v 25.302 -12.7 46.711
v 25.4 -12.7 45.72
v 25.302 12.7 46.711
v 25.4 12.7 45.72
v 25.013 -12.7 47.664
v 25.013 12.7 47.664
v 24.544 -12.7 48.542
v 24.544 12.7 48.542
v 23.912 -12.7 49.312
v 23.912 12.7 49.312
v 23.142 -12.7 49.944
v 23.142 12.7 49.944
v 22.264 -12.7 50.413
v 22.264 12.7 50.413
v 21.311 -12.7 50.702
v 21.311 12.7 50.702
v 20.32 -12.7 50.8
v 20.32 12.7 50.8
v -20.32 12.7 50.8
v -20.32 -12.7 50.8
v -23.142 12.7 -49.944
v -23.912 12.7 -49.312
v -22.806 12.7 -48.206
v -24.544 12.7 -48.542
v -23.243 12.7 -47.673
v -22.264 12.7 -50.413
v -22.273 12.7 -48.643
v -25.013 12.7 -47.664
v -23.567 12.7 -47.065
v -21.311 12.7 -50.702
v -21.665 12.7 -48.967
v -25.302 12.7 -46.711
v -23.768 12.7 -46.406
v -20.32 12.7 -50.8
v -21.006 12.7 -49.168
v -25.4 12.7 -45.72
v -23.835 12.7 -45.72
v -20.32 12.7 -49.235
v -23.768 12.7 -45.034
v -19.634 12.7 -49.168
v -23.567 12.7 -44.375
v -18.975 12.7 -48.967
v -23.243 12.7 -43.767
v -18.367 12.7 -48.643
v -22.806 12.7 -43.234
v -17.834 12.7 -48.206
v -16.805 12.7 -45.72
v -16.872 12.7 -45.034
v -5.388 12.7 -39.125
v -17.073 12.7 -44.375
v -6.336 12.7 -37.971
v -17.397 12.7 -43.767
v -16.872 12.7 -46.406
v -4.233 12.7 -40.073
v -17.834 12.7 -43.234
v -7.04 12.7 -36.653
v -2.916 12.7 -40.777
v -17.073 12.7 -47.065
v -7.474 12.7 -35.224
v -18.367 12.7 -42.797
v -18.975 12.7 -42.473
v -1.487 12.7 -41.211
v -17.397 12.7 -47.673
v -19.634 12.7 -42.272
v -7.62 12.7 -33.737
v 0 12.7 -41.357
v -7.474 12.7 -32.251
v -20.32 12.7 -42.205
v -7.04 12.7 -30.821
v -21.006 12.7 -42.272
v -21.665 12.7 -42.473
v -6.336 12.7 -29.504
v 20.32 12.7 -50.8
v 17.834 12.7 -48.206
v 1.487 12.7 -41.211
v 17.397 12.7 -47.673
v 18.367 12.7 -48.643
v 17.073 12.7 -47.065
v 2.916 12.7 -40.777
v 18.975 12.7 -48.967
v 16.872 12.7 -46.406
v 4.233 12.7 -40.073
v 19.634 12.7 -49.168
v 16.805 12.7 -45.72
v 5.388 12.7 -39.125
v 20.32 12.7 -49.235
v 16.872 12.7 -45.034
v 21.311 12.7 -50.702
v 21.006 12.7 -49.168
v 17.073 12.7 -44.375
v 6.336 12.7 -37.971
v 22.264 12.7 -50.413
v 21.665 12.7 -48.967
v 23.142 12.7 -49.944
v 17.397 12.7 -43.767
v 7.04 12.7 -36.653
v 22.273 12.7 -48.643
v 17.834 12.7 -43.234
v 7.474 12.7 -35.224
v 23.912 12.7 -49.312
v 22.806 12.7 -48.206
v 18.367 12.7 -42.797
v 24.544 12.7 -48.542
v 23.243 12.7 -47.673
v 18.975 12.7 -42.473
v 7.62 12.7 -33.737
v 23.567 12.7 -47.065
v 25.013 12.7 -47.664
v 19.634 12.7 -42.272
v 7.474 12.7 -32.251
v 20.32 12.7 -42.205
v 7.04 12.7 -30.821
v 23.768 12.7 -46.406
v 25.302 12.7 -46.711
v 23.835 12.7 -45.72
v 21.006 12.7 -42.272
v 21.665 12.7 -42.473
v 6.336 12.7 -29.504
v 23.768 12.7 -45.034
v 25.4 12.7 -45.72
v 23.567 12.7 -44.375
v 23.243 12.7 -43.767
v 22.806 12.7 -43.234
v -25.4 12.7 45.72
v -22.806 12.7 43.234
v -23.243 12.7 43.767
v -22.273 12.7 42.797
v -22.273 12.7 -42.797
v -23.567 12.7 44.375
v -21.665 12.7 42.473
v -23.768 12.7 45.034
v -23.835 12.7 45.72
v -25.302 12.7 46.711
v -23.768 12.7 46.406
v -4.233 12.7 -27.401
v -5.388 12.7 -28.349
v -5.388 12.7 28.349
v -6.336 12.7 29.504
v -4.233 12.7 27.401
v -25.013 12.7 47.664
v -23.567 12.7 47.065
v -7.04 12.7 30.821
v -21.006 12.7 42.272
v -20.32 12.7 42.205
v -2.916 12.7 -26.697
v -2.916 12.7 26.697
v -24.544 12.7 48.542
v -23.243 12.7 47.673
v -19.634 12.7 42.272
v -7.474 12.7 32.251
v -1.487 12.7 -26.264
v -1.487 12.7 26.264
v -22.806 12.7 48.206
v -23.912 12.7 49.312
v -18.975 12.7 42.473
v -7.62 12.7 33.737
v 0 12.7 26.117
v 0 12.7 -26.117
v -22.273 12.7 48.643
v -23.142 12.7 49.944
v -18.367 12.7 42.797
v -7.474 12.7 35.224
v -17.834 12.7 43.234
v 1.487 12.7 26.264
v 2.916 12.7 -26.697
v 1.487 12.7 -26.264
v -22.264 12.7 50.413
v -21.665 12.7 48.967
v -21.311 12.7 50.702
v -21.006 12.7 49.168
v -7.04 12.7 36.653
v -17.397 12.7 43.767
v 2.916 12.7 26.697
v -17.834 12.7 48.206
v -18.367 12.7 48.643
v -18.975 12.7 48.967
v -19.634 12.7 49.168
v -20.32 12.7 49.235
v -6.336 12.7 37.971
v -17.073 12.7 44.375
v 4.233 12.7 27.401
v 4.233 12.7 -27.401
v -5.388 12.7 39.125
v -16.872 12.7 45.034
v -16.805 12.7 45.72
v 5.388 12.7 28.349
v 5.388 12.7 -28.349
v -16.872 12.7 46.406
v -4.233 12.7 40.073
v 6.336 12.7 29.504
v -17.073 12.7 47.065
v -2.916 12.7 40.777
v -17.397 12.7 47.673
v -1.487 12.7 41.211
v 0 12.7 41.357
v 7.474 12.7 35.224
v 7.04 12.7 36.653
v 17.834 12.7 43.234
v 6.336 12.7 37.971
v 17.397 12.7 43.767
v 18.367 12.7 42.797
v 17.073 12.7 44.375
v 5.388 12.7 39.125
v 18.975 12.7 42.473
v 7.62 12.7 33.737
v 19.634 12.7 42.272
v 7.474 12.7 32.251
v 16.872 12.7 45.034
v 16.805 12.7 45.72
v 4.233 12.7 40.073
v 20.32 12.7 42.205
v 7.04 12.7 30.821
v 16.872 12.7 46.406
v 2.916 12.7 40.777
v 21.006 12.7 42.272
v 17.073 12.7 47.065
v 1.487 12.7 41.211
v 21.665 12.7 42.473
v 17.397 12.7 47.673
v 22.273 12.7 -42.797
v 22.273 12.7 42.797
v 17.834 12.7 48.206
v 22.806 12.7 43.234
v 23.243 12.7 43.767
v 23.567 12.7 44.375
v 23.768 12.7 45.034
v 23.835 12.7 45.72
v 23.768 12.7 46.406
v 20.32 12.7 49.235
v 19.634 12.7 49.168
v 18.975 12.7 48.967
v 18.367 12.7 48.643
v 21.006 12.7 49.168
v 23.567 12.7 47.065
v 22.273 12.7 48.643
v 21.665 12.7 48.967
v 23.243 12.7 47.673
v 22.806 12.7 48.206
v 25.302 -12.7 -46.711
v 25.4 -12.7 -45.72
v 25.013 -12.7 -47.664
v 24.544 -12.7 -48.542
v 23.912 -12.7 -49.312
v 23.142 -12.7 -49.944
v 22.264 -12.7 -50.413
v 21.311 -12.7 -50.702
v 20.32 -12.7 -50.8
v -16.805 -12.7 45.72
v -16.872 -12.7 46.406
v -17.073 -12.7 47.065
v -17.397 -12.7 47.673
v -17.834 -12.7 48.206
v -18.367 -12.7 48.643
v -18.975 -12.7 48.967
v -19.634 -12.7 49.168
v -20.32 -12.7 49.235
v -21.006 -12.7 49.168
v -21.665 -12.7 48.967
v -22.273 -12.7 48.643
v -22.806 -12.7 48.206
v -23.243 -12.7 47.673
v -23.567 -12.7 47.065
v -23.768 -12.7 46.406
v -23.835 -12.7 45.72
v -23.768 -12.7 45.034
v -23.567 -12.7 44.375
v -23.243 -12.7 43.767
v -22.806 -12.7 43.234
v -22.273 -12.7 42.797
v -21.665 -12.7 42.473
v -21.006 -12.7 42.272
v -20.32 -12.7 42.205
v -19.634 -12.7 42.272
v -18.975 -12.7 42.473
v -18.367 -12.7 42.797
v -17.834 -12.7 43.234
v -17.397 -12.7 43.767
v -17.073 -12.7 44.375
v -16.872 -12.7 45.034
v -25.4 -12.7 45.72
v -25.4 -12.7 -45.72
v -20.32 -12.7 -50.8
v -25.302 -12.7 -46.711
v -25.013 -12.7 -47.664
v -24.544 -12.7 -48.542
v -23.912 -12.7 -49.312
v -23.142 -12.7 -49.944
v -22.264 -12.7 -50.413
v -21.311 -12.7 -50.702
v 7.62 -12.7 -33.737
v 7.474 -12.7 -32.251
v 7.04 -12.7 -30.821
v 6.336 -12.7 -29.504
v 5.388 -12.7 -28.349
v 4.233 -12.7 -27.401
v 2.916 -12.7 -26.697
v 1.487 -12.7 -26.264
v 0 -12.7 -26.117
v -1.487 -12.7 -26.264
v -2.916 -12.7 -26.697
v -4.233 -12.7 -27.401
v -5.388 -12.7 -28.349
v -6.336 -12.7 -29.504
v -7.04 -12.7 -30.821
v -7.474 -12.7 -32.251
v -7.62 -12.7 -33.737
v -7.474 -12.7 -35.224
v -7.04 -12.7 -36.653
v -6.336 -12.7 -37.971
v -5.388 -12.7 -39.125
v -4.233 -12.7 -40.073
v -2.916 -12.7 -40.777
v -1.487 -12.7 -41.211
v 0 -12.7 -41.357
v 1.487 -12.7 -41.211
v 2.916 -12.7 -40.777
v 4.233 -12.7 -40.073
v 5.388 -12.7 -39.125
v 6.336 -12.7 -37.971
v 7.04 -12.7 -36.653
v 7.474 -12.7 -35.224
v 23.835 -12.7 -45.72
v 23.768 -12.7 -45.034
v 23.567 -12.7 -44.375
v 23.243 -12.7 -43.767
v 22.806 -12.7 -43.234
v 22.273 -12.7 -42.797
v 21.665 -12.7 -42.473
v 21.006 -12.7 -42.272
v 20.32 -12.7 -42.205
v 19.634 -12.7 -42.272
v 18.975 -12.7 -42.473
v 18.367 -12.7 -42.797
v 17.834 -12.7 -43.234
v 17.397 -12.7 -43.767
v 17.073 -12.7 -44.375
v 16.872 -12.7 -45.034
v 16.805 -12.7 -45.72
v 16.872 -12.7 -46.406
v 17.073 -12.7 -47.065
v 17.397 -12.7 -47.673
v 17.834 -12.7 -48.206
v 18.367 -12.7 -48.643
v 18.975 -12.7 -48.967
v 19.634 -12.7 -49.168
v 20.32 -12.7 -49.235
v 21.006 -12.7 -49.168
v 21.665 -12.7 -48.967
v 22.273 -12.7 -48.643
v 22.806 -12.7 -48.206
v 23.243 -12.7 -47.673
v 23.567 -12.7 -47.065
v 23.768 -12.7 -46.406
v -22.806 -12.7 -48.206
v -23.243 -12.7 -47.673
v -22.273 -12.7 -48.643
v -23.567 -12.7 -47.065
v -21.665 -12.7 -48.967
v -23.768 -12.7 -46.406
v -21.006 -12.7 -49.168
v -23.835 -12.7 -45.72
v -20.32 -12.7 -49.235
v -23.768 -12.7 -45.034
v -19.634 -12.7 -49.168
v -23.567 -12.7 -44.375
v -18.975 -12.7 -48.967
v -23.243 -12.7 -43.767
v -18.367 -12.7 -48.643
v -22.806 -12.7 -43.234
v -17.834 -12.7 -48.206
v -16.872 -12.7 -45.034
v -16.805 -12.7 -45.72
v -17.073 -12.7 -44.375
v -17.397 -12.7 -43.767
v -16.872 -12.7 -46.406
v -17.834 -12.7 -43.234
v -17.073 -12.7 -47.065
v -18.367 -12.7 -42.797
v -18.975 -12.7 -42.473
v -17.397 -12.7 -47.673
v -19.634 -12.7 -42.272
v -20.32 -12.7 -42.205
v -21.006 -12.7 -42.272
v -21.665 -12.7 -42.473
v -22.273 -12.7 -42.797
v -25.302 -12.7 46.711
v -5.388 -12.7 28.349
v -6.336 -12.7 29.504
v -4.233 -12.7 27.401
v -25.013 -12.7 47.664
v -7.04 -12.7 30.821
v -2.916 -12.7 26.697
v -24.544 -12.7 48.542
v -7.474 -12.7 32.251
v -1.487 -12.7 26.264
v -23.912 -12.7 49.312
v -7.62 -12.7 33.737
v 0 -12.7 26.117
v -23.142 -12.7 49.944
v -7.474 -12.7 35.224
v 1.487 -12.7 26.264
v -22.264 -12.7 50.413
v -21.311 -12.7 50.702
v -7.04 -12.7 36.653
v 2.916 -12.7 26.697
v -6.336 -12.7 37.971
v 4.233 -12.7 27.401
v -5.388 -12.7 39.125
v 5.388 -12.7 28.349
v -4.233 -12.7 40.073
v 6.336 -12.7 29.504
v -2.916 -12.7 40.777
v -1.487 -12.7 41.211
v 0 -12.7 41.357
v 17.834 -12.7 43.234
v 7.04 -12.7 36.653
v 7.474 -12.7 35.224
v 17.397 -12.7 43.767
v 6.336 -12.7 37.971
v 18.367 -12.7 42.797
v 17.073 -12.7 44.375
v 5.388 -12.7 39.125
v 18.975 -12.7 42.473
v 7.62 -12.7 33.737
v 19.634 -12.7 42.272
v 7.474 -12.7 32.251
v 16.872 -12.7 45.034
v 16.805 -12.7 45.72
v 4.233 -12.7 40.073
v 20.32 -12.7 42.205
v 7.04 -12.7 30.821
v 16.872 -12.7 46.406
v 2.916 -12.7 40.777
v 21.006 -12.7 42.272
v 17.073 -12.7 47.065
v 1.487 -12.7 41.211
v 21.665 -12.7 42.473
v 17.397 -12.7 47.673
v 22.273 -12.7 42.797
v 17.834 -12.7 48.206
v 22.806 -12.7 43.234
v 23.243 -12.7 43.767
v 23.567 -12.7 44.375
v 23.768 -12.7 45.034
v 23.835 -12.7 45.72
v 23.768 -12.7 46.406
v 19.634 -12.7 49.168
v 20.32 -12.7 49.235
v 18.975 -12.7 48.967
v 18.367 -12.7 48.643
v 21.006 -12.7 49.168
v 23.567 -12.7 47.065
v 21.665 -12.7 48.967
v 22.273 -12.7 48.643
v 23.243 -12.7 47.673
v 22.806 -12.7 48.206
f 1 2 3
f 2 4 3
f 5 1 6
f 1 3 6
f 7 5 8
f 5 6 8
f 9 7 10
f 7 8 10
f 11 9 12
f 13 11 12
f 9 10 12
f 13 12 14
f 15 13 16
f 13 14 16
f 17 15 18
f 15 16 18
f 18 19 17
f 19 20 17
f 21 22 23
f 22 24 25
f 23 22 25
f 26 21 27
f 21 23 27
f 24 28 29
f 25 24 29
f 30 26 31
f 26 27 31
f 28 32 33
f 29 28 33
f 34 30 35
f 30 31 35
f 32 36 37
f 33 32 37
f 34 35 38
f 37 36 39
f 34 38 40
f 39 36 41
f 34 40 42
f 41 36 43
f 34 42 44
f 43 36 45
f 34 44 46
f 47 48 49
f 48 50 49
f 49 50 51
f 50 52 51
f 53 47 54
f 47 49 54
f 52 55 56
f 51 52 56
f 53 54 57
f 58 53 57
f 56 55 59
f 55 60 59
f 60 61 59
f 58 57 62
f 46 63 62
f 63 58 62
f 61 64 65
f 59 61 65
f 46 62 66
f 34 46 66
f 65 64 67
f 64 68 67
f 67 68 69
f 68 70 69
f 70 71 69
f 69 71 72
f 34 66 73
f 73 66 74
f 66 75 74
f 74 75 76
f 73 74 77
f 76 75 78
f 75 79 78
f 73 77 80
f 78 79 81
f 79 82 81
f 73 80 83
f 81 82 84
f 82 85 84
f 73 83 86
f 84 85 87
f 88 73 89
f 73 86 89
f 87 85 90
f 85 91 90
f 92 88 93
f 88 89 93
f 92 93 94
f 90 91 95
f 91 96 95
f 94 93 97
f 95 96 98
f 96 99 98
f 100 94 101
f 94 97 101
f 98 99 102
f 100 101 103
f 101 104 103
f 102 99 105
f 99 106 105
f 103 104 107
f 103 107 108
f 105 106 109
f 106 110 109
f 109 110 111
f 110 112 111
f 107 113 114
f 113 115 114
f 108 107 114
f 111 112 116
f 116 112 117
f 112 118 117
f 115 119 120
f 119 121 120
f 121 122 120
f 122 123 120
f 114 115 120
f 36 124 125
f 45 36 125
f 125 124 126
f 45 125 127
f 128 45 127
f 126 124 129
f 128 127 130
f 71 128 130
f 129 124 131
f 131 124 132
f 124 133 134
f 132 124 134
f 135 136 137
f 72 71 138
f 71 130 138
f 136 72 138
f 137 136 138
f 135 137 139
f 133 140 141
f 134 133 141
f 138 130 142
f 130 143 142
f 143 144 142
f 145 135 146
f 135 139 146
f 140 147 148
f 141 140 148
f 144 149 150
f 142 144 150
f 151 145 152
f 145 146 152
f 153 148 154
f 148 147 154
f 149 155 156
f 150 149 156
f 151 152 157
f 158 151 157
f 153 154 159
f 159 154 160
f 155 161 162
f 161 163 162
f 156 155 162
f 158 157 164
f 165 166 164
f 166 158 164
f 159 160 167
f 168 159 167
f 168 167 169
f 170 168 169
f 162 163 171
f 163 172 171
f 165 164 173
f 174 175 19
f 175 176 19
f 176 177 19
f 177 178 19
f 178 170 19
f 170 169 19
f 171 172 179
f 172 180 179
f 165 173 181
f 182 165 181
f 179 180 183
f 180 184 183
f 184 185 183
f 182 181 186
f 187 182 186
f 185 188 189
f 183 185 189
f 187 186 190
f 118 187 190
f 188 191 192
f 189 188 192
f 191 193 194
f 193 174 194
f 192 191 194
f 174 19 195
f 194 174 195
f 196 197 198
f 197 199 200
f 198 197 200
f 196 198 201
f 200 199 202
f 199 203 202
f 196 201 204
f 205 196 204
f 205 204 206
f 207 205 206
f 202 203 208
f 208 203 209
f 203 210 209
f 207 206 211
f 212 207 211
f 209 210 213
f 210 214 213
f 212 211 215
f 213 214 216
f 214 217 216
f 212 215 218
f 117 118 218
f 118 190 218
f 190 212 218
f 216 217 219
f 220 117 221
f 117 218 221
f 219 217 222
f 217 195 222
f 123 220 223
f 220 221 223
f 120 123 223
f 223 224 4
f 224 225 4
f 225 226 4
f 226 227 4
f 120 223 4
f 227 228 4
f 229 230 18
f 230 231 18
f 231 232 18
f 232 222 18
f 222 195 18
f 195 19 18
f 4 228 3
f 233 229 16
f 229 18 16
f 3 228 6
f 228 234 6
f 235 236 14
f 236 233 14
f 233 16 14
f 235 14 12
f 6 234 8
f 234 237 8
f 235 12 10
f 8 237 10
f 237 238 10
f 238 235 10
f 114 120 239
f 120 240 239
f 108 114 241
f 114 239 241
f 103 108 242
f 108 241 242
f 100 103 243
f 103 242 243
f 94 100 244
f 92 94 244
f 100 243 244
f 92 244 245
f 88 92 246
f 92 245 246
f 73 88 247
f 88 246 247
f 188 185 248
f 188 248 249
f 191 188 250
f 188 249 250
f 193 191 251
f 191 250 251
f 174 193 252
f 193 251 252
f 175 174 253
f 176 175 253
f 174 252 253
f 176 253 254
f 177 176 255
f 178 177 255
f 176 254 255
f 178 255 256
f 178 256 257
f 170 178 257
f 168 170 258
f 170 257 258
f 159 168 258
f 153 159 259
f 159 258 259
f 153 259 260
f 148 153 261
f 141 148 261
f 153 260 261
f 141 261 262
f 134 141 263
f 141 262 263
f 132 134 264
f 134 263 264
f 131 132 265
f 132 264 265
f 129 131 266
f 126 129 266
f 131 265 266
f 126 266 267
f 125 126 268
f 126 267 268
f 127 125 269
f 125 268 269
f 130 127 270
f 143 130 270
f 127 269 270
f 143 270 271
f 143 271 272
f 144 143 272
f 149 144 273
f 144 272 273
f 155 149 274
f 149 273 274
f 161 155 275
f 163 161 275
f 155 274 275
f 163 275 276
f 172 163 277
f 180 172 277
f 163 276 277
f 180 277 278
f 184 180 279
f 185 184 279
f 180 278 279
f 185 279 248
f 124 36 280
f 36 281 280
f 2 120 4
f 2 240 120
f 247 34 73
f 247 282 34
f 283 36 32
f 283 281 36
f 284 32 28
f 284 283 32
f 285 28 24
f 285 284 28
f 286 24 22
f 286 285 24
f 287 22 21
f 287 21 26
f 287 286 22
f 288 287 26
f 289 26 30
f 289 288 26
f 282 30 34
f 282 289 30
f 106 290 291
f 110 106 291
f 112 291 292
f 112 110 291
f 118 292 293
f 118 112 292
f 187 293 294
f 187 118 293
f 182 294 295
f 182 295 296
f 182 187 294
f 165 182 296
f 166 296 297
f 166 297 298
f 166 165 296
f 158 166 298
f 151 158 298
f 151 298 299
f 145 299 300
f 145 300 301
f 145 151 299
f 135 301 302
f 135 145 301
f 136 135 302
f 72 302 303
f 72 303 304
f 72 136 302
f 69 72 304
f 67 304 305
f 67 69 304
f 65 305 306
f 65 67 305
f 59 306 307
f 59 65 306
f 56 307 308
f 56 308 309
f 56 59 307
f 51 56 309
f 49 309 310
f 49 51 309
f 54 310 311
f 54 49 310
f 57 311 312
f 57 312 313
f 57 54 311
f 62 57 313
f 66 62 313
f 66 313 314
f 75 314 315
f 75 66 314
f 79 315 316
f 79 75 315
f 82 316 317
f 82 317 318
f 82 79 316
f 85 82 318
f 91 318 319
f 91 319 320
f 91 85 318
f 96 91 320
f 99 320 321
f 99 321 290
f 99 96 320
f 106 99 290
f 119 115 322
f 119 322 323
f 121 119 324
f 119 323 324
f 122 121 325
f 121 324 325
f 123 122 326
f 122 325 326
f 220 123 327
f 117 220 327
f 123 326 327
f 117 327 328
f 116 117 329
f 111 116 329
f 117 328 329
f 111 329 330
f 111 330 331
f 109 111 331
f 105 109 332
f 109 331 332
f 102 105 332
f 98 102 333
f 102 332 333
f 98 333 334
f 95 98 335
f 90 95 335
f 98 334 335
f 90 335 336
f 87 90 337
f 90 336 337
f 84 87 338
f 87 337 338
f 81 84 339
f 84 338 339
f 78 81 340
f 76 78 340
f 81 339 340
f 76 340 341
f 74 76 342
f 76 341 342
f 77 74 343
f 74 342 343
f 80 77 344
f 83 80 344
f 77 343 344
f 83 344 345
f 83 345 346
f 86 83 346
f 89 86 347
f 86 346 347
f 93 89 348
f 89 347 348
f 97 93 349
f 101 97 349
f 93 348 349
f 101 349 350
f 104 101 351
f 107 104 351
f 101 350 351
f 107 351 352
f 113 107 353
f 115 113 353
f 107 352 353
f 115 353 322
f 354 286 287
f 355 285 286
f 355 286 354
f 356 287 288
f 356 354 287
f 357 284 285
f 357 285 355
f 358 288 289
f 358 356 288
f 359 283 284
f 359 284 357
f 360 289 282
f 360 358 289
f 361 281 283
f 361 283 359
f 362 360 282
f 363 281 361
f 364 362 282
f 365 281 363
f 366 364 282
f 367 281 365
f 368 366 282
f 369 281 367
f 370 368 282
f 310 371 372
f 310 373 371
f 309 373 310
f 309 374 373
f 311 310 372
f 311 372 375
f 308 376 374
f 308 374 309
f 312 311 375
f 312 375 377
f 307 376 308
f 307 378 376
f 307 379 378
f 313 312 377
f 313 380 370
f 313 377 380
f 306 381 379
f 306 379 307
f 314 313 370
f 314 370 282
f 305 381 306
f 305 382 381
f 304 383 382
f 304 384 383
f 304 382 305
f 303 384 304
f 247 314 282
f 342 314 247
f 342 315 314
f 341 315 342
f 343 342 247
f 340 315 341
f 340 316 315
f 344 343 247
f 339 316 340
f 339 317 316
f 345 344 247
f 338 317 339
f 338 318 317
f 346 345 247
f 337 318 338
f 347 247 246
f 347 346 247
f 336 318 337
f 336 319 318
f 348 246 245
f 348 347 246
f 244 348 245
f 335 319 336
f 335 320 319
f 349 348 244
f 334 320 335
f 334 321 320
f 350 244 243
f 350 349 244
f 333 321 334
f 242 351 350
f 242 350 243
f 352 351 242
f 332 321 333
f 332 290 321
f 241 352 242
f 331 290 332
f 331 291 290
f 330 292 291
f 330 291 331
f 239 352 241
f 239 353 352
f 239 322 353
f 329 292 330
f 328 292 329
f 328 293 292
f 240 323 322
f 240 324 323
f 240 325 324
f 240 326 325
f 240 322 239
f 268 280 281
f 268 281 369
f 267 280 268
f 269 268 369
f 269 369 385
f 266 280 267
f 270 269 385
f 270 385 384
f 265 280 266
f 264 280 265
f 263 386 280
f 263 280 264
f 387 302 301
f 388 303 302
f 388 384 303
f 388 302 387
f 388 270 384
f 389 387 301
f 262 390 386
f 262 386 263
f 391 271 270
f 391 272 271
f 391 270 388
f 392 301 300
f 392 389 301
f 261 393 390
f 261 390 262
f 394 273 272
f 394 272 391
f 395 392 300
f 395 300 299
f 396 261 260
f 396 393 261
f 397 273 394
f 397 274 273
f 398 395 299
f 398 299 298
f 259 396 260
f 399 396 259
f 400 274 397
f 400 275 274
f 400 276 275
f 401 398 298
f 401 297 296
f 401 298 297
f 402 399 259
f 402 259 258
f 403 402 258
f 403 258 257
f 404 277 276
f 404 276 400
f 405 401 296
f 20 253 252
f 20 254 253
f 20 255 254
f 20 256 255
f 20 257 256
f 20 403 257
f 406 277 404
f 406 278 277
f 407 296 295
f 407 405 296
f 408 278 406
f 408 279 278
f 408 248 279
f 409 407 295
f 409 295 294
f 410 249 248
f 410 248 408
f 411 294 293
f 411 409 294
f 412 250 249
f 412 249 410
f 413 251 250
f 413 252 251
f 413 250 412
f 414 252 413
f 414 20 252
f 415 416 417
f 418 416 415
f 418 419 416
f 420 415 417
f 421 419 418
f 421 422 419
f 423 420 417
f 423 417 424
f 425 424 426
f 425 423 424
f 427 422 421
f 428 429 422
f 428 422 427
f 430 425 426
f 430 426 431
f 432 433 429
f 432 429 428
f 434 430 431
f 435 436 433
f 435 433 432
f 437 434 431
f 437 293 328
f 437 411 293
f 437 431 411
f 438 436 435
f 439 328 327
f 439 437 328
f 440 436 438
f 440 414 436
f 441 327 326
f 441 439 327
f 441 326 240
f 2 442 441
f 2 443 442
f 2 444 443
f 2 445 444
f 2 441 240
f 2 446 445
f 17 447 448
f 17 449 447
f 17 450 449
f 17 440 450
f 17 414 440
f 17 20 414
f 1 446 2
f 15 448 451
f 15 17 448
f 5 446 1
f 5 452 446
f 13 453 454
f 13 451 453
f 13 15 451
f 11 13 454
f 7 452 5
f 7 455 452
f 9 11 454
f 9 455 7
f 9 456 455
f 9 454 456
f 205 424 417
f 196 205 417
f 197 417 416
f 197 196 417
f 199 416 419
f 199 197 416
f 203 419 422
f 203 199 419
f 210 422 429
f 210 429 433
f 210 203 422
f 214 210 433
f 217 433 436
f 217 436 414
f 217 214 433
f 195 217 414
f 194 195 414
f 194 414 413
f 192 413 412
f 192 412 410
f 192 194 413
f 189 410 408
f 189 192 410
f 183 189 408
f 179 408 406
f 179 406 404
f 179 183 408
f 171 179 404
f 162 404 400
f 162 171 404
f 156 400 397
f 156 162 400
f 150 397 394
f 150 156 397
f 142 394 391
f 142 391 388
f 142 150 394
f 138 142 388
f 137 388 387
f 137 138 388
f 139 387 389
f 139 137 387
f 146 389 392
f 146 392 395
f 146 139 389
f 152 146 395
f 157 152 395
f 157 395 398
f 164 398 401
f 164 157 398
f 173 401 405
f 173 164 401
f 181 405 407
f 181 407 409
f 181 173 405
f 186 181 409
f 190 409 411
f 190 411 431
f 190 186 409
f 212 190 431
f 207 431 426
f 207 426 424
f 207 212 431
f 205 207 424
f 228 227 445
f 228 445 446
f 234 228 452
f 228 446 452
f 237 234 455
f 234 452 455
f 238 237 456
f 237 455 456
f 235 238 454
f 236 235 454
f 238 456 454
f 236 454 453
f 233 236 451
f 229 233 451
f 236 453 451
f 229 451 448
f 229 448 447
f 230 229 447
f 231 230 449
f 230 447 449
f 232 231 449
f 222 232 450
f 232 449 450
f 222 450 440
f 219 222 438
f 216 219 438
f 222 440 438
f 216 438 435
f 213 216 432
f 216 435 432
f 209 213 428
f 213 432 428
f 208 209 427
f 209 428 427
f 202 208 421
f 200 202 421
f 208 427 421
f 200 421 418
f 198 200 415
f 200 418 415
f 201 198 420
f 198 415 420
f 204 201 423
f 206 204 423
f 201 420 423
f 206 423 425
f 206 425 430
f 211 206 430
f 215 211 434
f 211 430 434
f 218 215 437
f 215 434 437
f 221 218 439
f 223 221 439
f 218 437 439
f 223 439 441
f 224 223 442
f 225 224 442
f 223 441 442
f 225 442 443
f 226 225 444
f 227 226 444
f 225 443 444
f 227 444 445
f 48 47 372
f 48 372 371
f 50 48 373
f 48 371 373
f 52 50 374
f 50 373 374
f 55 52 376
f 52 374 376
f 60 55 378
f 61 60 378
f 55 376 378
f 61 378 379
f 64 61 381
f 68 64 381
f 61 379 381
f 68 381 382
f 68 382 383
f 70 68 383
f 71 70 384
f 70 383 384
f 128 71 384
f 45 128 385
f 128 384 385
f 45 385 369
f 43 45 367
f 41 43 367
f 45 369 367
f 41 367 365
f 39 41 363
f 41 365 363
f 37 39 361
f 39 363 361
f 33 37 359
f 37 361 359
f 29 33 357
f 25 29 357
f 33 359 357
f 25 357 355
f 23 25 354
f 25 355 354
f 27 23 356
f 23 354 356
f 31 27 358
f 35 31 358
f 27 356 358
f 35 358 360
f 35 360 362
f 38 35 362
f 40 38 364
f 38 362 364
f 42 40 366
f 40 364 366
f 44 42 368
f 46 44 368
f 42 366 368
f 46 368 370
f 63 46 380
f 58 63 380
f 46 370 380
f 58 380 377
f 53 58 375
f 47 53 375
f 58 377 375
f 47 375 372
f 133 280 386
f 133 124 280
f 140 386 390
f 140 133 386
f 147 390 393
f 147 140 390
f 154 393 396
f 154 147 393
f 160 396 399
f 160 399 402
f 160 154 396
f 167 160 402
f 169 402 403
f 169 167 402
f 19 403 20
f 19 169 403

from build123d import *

# Parameters (mm, degrees)
F0_W     = 50.8
F0_H     = 101.6
F0_R     = 7.62
F1_DEPTH = 12.7
F2_R     = 5.08
F3_R     = 3.515063
F4_DEPTH = 25.4


with BuildPart() as f1:
    # F0 (on Front) → F1 (new body, symmetric)
    with BuildSketch(Plane.XZ):
        Rectangle(F0_W, F0_H)
        with Locations((0, -33.737253)):
            Circle(F0_R, mode=Mode.SUBTRACT)
        with Locations((0, 33.737253)):
            Circle(F0_R, mode=Mode.SUBTRACT)
    extrude(amount=F1_DEPTH, both=True)

    # F2
    f2_edges = [f1.edges().sort_by_distance(p)[0] for p in [
        (25.4, 0, -50.8),
        (-25.4, 0, -50.8),
        (25.4, 0, 50.8),
        (-25.4, 0, 50.8),
    ]]
    fillet(f2_edges, radius=F2_R)

    # F3 (on face) → F4 (cut, symmetric)
    with BuildSketch(Plane.XZ.offset(12.7)):
        with Locations((-20.32, 45.72)):
            Circle(F3_R)
        with Locations((-20.32, -45.72)):
            Circle(F3_R)
        with Locations((20.32, 45.72)):
            Circle(F3_R)
        with Locations((20.32, -45.72)):
            Circle(F3_R)
    extrude(amount=F4_DEPTH, both=True, mode=Mode.SUBTRACT)


solid = f1.part
